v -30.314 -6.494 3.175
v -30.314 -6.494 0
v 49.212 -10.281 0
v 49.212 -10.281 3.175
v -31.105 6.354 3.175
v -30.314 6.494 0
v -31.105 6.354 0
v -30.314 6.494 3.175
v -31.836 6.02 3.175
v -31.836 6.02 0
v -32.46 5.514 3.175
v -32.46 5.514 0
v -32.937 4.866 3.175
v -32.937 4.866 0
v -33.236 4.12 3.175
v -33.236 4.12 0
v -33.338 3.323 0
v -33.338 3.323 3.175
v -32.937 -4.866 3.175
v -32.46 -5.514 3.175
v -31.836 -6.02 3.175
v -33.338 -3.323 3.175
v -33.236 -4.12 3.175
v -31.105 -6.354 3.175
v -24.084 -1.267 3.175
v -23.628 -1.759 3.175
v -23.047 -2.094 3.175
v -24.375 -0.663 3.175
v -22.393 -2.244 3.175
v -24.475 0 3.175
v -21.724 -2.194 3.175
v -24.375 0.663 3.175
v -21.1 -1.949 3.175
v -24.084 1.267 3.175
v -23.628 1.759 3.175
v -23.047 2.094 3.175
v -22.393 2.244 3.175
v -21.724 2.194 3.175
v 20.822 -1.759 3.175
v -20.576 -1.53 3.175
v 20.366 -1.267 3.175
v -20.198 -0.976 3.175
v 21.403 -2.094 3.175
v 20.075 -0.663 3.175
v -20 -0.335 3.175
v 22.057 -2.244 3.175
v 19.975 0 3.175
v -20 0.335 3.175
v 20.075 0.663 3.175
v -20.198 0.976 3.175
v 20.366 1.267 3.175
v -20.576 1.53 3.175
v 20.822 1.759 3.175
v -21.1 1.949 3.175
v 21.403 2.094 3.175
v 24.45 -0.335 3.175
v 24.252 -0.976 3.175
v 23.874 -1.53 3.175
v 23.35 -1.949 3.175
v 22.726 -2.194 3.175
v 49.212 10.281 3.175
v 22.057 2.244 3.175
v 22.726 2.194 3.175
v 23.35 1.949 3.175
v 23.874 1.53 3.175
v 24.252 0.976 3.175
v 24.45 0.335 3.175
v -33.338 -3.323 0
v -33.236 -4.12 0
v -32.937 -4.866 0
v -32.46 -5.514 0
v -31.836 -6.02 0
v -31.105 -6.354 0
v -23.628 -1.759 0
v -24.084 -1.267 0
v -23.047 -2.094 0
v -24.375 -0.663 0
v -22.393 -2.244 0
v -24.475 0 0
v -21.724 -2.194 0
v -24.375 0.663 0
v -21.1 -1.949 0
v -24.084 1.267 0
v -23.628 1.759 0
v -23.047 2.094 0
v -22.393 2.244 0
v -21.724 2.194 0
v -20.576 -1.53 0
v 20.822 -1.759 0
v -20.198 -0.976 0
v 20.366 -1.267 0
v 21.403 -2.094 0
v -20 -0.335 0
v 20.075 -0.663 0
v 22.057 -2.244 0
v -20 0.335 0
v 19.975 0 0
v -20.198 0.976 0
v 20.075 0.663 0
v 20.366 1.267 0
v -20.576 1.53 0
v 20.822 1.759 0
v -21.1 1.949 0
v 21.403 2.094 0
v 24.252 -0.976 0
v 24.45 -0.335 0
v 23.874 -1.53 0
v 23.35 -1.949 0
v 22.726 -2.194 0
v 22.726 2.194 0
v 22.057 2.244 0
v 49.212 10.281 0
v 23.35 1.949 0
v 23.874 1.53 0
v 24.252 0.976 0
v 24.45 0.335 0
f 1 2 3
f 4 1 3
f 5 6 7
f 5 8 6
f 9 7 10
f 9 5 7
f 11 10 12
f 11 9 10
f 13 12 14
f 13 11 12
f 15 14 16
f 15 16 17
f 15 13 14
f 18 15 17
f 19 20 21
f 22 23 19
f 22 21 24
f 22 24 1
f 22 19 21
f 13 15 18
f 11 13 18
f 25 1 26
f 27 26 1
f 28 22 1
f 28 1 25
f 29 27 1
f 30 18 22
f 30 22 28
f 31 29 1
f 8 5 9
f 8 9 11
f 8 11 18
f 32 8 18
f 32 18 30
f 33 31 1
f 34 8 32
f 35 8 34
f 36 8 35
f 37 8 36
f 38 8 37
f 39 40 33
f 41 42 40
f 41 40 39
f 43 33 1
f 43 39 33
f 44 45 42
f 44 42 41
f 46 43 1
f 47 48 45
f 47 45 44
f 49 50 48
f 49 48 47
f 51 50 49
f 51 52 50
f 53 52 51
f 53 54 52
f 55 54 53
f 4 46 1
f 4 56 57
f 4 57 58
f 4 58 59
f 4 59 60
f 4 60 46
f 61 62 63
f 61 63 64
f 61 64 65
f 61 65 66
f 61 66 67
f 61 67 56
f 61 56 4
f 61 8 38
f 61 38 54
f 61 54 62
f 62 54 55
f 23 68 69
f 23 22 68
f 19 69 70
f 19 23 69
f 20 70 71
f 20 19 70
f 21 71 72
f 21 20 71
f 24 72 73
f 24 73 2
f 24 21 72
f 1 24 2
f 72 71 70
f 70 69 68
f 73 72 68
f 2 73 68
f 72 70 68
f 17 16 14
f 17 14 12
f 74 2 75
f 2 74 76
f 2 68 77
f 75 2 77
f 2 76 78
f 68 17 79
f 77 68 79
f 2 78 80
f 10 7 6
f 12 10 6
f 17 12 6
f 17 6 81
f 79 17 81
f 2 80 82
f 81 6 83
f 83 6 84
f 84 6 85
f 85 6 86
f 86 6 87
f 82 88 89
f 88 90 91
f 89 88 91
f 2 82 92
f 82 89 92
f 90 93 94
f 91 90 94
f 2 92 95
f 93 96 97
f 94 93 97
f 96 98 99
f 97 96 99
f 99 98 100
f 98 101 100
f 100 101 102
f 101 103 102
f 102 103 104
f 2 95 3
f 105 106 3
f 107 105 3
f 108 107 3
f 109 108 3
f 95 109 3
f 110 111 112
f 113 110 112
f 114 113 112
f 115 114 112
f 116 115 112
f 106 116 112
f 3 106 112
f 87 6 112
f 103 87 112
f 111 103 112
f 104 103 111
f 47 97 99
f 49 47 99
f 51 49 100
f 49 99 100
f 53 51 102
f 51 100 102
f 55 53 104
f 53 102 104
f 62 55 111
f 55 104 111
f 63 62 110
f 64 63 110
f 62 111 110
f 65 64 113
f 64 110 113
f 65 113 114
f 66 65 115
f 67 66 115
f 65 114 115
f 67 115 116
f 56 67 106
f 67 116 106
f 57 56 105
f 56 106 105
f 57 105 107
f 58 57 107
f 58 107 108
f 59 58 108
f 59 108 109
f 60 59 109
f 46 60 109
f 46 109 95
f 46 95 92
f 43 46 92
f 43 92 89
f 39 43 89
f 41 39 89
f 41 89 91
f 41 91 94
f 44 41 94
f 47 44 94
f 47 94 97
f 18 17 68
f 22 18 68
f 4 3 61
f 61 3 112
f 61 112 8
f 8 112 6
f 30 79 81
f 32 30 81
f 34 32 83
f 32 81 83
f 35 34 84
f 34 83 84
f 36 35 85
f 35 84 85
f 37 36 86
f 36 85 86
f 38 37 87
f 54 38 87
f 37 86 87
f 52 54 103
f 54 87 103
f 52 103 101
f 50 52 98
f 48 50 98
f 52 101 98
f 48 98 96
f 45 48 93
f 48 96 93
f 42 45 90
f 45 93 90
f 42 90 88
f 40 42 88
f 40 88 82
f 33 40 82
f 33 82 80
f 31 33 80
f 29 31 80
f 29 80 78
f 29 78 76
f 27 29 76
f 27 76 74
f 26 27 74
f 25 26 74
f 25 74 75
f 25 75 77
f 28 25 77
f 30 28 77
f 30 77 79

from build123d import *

# Parameters (mm, degrees)
BOSS_EXTRUDE1_DEPTH  = 3.175
M4_CLEARANCE_HOLE2_D = 4.5
FILLET1_R            = 3.175


with BuildPart() as part:
    # Sketch1 → Boss-Extrude1 (new body)
    with BuildSketch(Plane.XY):
        Polygon((49.2125, 10.280952381), (-33.3375, 6.35), (-33.3375, -6.35), (49.2125, -10.280952381), align=None)
    extrude(amount=BOSS_EXTRUDE1_DEPTH)

    # M4 Clearance Hole2 (through all)
    with Locations(Plane.XY.offset(3.175)):
        with Locations((-22.225, 0), (22.225, 0)):
            Hole(M4_CLEARANCE_HOLE2_D / 2)

    # Fillet1
    fillet1_edges = [part.edges().sort_by_distance(p)[0] for p in [
        (-33.3375, -6.35, 1.5875),
        (-33.3375, 6.35, 1.5875),
    ]]
    fillet(fillet1_edges, radius=FILLET1_R)


solid = part.part
